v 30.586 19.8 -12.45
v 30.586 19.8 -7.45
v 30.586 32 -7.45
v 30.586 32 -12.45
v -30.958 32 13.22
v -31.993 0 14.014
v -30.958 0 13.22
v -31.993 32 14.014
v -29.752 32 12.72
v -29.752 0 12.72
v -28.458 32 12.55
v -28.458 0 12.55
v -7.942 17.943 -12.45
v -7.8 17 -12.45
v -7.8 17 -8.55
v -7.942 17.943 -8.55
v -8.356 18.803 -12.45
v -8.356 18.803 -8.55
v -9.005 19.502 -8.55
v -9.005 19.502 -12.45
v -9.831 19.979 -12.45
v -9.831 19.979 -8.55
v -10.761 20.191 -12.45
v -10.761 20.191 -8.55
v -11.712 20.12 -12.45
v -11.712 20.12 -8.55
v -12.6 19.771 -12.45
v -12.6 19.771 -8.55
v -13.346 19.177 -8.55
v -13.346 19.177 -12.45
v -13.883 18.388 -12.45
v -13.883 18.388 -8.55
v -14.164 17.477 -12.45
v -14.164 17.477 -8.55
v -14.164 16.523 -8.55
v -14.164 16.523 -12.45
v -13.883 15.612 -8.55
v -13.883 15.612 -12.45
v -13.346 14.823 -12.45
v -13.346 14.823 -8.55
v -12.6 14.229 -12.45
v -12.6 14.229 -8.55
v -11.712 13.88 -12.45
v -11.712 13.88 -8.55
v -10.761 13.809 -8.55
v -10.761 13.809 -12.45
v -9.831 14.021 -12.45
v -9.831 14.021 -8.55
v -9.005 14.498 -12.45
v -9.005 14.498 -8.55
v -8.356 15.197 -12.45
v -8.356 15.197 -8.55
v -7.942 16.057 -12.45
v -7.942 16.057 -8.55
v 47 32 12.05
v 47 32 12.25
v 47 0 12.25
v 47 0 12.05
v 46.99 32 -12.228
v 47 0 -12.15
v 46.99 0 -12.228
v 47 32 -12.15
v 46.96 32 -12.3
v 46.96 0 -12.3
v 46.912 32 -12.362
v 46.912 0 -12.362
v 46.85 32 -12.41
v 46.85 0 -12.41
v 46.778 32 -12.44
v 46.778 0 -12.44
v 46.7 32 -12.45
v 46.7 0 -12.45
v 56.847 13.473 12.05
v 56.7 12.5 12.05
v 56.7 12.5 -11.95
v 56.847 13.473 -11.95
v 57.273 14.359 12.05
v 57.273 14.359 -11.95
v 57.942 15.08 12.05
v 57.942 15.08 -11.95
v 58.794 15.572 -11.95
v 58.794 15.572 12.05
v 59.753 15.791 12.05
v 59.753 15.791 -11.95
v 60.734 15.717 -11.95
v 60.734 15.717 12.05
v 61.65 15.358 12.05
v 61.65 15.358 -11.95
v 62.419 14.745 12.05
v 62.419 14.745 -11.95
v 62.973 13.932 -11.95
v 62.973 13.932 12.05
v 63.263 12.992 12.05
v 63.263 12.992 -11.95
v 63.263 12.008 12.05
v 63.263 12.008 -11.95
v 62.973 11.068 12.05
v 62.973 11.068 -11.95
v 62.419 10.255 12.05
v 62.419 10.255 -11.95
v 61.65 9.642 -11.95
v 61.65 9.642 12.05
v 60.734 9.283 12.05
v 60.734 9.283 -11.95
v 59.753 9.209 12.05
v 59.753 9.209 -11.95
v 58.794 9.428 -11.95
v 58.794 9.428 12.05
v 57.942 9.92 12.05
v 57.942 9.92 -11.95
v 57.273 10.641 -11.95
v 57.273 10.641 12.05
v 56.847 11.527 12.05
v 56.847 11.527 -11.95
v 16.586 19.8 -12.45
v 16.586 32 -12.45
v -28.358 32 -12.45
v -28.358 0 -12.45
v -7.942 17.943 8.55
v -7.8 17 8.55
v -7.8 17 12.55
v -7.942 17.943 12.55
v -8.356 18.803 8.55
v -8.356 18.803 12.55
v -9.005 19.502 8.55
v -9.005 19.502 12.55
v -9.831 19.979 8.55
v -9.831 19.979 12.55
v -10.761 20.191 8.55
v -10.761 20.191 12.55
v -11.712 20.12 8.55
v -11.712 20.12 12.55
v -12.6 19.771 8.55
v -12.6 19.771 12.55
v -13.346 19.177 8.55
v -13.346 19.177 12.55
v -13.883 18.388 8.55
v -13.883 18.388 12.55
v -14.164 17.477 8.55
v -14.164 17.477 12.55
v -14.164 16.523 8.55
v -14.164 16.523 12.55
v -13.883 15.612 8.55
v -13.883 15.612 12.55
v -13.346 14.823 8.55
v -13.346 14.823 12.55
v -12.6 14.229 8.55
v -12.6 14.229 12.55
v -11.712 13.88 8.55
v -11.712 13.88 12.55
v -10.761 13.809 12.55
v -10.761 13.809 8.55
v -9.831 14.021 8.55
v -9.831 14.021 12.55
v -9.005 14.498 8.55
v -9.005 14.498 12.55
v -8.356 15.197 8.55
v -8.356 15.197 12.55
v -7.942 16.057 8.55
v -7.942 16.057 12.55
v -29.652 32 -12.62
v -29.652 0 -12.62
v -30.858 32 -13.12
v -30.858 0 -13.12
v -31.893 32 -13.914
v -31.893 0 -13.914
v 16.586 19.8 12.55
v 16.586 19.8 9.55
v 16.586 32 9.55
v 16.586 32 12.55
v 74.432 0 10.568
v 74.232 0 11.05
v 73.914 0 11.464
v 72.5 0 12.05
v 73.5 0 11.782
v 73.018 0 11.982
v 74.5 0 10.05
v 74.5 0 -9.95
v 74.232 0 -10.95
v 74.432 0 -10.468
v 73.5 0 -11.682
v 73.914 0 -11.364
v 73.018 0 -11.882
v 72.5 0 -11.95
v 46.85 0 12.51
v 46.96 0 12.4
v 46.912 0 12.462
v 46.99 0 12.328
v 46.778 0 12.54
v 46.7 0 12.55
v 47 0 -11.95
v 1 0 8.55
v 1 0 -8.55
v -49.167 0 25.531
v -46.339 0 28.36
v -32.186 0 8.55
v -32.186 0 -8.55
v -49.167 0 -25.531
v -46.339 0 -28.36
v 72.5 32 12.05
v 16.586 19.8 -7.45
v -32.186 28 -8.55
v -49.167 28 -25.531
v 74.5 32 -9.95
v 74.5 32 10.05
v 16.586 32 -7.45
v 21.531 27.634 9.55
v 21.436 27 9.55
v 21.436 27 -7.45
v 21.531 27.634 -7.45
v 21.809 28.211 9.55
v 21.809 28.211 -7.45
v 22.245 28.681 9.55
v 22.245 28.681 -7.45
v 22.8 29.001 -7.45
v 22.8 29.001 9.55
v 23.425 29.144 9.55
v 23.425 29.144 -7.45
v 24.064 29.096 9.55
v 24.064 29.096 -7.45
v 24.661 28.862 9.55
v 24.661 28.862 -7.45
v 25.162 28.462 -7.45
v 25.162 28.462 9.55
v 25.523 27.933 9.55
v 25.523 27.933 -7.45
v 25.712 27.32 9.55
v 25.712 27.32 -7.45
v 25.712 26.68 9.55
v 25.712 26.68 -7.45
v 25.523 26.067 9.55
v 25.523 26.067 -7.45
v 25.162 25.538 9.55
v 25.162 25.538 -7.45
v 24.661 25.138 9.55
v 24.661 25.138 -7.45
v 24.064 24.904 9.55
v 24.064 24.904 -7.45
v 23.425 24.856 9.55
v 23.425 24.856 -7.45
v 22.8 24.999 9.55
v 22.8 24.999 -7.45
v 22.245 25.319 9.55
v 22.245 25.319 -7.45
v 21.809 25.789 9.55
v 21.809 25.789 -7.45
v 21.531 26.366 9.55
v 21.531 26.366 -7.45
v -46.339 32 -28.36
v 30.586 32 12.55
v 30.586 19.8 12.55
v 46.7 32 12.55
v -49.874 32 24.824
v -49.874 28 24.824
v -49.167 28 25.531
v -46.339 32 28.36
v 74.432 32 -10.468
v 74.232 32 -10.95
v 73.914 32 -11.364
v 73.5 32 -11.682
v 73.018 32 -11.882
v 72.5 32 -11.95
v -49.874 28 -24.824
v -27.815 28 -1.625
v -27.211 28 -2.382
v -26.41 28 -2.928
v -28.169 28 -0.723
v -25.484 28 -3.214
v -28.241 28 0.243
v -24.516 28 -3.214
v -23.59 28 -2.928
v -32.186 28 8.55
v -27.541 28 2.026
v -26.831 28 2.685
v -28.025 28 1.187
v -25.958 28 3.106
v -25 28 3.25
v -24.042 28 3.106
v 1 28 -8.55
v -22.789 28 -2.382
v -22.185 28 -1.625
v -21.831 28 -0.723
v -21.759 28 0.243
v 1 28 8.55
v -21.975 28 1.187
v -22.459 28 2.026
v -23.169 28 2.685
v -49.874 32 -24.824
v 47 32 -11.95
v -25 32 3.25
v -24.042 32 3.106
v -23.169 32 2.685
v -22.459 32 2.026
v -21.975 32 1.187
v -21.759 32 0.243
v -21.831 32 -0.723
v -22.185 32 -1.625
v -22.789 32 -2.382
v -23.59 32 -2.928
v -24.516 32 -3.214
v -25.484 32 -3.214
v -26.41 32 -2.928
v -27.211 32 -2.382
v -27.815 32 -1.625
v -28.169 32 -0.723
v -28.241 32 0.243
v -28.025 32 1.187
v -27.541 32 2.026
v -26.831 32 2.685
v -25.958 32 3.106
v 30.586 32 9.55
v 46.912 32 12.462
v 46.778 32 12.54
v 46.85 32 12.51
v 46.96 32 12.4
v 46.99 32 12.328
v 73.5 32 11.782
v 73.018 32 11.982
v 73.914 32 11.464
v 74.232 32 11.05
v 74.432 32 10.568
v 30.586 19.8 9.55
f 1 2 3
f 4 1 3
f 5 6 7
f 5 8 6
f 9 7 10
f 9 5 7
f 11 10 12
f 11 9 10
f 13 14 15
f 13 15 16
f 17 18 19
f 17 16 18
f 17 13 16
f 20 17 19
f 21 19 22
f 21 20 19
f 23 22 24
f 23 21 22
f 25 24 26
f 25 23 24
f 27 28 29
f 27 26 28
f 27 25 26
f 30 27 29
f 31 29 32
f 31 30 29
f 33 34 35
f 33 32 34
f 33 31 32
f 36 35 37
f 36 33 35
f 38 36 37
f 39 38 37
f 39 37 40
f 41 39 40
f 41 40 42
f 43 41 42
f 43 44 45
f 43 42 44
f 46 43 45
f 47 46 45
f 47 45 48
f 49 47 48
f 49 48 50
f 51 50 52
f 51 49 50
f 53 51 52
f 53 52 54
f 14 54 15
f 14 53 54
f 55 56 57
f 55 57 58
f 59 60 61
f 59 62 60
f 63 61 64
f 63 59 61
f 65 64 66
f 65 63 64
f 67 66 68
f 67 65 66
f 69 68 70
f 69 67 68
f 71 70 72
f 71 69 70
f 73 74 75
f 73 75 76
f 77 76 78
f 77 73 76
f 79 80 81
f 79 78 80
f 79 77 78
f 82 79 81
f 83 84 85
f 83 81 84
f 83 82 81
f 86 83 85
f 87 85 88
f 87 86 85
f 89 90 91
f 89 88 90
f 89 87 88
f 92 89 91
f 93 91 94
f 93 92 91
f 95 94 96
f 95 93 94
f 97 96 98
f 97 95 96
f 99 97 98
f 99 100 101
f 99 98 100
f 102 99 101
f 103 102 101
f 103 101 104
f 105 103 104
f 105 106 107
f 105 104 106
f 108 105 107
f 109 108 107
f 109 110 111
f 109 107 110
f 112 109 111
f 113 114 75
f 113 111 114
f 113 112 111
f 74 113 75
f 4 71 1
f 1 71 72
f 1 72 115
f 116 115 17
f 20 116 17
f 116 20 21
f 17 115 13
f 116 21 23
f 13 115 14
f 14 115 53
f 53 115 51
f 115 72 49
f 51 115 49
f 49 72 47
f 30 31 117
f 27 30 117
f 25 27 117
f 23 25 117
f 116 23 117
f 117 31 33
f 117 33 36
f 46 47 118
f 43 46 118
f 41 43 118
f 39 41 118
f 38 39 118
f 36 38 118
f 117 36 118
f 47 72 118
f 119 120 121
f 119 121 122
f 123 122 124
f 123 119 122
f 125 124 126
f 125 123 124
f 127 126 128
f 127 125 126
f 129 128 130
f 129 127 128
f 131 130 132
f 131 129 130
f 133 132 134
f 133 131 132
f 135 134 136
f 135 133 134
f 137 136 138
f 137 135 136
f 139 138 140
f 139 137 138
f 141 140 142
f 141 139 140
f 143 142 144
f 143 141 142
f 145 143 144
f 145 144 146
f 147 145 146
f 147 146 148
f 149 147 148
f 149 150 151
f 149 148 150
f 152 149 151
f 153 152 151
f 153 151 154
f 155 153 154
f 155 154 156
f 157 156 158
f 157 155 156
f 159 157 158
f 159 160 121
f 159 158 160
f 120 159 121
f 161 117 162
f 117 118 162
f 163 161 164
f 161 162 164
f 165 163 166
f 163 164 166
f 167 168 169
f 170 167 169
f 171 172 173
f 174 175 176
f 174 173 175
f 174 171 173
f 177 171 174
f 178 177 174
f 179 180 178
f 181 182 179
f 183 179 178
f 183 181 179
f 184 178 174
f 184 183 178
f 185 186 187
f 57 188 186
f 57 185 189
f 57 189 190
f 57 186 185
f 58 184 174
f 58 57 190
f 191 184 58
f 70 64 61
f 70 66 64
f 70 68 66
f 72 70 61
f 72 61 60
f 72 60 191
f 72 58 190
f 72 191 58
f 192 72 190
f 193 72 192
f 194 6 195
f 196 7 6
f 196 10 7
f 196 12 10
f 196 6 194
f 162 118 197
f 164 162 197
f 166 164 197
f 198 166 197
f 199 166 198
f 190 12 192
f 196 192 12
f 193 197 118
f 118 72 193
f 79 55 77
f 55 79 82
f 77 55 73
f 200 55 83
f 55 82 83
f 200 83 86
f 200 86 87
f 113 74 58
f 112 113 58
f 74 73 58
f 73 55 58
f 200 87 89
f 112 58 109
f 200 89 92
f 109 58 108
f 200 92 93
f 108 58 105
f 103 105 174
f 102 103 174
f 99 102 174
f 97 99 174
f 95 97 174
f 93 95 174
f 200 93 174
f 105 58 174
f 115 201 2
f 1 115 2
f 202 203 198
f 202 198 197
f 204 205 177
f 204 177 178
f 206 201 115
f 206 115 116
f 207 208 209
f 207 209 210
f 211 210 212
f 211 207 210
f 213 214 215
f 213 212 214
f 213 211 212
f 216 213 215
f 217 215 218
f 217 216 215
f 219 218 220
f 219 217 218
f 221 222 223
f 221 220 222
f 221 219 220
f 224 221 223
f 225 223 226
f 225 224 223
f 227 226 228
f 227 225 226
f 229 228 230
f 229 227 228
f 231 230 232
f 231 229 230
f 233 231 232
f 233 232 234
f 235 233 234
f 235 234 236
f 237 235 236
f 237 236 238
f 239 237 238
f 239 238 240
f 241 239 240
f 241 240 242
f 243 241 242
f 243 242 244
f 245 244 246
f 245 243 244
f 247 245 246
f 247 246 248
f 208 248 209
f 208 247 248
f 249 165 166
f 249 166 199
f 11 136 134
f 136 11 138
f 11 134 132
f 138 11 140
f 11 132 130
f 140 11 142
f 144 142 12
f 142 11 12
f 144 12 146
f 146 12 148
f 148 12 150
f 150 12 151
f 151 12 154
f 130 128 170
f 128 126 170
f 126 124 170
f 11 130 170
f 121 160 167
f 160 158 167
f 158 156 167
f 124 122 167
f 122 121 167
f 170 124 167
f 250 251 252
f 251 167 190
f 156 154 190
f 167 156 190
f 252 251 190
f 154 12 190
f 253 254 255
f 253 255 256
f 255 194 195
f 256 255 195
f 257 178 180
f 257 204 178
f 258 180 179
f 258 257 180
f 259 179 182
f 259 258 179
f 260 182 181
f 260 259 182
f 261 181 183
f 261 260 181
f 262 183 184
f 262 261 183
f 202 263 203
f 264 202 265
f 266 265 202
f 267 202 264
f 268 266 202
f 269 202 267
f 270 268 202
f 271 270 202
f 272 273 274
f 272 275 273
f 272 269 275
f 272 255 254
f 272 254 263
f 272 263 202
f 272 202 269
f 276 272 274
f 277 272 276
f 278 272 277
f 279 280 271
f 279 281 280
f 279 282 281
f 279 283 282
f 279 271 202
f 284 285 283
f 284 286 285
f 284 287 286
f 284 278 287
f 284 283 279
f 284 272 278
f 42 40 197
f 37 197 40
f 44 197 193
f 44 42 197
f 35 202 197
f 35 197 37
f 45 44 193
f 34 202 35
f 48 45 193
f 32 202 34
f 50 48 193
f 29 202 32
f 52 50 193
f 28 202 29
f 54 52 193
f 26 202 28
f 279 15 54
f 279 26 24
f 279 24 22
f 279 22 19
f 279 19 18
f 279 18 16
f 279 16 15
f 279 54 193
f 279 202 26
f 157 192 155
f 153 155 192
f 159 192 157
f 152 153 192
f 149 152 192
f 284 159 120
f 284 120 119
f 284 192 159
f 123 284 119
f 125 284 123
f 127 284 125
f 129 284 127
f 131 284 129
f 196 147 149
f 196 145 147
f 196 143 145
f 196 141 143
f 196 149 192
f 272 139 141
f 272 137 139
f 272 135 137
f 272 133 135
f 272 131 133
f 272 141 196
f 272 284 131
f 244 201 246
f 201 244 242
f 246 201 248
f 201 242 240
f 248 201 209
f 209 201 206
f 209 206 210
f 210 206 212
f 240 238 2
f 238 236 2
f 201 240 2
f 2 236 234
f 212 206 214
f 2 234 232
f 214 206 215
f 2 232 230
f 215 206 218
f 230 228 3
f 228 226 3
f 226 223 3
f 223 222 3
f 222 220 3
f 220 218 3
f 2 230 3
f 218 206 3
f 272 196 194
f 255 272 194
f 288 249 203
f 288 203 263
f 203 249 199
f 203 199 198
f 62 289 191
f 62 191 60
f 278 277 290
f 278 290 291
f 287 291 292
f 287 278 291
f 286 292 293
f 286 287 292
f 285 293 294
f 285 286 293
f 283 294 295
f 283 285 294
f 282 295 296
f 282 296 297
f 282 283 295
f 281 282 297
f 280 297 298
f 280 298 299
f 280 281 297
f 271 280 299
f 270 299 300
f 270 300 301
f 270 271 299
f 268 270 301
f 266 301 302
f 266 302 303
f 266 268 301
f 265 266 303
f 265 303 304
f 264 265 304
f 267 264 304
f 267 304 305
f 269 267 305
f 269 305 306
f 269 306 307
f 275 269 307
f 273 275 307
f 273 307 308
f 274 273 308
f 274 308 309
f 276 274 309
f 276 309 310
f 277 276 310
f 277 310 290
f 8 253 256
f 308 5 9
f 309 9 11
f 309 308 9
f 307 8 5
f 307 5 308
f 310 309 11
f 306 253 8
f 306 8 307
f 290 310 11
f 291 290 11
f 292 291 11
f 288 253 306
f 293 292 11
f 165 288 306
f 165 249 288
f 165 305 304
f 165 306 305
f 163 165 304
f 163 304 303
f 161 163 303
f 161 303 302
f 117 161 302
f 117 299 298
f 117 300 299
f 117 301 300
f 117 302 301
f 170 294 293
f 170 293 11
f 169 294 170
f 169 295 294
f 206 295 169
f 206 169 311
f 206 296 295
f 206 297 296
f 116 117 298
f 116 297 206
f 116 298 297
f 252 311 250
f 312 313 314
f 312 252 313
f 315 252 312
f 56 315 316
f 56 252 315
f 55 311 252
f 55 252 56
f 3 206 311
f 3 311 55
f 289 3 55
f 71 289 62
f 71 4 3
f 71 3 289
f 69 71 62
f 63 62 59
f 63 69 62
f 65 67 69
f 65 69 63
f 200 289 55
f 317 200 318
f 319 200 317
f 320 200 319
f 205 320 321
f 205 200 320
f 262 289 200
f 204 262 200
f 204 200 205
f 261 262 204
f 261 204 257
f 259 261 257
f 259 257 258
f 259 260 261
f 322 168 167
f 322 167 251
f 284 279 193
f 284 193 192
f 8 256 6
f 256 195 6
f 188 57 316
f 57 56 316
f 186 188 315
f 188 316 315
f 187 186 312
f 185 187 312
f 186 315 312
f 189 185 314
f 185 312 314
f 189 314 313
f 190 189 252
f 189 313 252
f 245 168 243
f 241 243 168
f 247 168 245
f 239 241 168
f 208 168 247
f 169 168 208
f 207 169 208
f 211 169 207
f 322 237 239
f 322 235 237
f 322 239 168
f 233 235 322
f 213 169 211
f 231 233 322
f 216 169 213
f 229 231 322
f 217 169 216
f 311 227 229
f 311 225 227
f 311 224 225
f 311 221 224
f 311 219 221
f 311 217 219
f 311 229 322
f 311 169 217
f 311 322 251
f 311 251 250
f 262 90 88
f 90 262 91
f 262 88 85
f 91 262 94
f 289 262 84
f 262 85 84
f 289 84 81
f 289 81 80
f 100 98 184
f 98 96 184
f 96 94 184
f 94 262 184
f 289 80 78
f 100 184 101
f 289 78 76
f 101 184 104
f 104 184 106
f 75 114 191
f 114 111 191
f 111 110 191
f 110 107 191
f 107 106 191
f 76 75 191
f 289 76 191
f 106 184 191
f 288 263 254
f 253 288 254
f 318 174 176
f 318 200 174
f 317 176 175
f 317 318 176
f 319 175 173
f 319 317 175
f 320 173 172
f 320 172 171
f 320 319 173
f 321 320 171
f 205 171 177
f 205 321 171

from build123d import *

# Parameters (mm, degrees)
BOSS_EXTRUDE1_DEPTH     = 27
SKETCH2_R               = 3.25
BOSS_EXTRUDE2_DEPTH     = 5
CUT_EXTRUDE1_DEPTH      = 92.228395409
CUT_EXTRUDE1_DEPTH_BACK = 92.228395409
SKETCH3_R               = 3.2
SKETCH4_W               = 10
SKETCH4_H               = 5
SKETCH4_H_2             = 3
CUT_EXTRUDE2_DEPTH      = 10.2
CUT_EXTRUDE3_DEPTH      = 90.058122159
CUT_EXTRUDE3_DEPTH_BACK = 90.058122159
SKETCH5_R               = 2.15
CUT_EXTRUDE4_DEPTH      = 92.183595829
CUT_EXTRUDE4_DEPTH_BACK = 92.183595829
SKETCH6_R               = 3.3
CUT_EXTRUDE5_START      = 9.55
SKETCH8_W               = 14
SKETCH8_H               = 14.4
CUT_EXTRUDE5_DEPTH      = 10
CUT_EXTRUDE6_START      = -7.45
SKETCH8_2_W             = 14
SKETCH8_2_H             = 14.4
CUT_EXTRUDE6_DEPTH      = 10
CUT_EXTRUDE7_DEPTH      = 87.332404543
CUT_EXTRUDE8_START      = -1
CUT_EXTRUDE8_DEPTH      = 86.163733723
FILLET3_R               = 5
FILLET4_R               = 2
FILLET5_R               = 0.3


with BuildPart() as part:
    # Sketch1 → Boss-Extrude1 (new body)
    with BuildSketch(Plane(origin=(0, 0, 0), x_dir=(1, 0, 0), z_dir=(0, 1, 0))):
        Polygon((0, 7.55), (-32.6, 7.55), (-49.874368671, 24.824368671), (-46.338834765, 28.359902577), (-30.428932188, 12.45), (75, 12.45), (75, -12.55), (-30.528932188, -12.55), (-46.338834765, -28.359902577), (-49.874368671, -24.824368671), (-32.6, -7.55), (0, -7.55), align=None)
    extrude(amount=BOSS_EXTRUDE1_DEPTH)

    # Sketch2 → Boss-Extrude2 (add)
    with BuildSketch(Plane(origin=(0, 27, 0), x_dir=(1, 0, 0), z_dir=(0, 1, 0))):
        Polygon((-49.874368671, 24.824368671), (-49.874368671, -24.824368671), (-46.338834765, -28.359902577), (-30.528932188, -12.55), (75, -12.55), (75, 12.45), (-30.428932188, 12.45), (-46.338834765, 28.359902577), align=None)
        with Locations(Location((-25, 0, 0), (0, 0, 270))):
            Circle(SKETCH2_R, mode=Mode.SUBTRACT)
    extrude(amount=BOSS_EXTRUDE2_DEPTH)

    # Sketch3 → Cut-Extrude1 (cut, two sides: drawn at the far end of the back side and taken through both)
    with BuildSketch(Plane.XY.offset(12.55).offset(-CUT_EXTRUDE1_DEPTH_BACK)):
        with Locations((-11, 17)):
            Circle(SKETCH3_R)
    extrude(amount=CUT_EXTRUDE1_DEPTH + CUT_EXTRUDE1_DEPTH_BACK, mode=Mode.SUBTRACT)

    # Sketch4 → Cut-Extrude2 (cut)
    with BuildSketch(Plane(origin=(0, 32, 0), x_dir=(1, 0, 0), z_dir=(0, 1, 0))):
        with Locations((23.58571545, 9.95)):
            Rectangle(SKETCH4_W, SKETCH4_H)
        with Locations((23.58571545, -11.05)):
            Rectangle(SKETCH4_W, SKETCH4_H_2)
    extrude(amount=-CUT_EXTRUDE2_DEPTH, mode=Mode.SUBTRACT)

    # Sketch5 → Cut-Extrude3 (cut, two sides: drawn at the far end of the back side and taken through both)
    with BuildSketch(Plane(origin=(0, 0, -7.45), x_dir=(-1, 0, 0), z_dir=(0, 0, -1)).offset(-CUT_EXTRUDE3_DEPTH_BACK)):
        with Locations((-23.58571545, 27)):
            Circle(SKETCH5_R)
    extrude(amount=CUT_EXTRUDE3_DEPTH + CUT_EXTRUDE3_DEPTH_BACK, mode=Mode.SUBTRACT)

    # Sketch6 → Cut-Extrude4 (cut, two sides: drawn at the far end of the back side and taken through both)
    with BuildSketch(Plane(origin=(0, 0, -12.45), x_dir=(-1, 0, 0), z_dir=(0, 0, -1)).offset(-CUT_EXTRUDE4_DEPTH_BACK)):
        with Locations((-60, 12.5)):
            Circle(SKETCH6_R)
    extrude(amount=CUT_EXTRUDE4_DEPTH + CUT_EXTRUDE4_DEPTH_BACK, mode=Mode.SUBTRACT)

    # Sketch8 → Cut-Extrude5 (cut)
    with BuildSketch(Plane.XY.offset(CUT_EXTRUDE5_START)):
        with Locations((23.58571545, 27)):
            Rectangle(SKETCH8_W, SKETCH8_H)
    extrude(amount=CUT_EXTRUDE5_DEPTH, mode=Mode.SUBTRACT)

    # Sketch8<2> → Cut-Extrude6 (cut)
    with BuildSketch(Plane.XY.offset(CUT_EXTRUDE6_START)):
        with Locations((23.58571545, 27)):
            Rectangle(SKETCH8_2_W, SKETCH8_2_H)
    extrude(amount=-CUT_EXTRUDE6_DEPTH, mode=Mode.SUBTRACT)

    # Sketch9 → Cut-Extrude7 (cut, through all)
    with BuildSketch(Plane.XZ):
        Polygon((75, 12.55), (47, 12.55), (47, 12.05), (74.5, 12.05), (74.5, -11.95), (47, -11.95), (47, -12.45), (75, -12.45), (75, -11.95), (75, 12.05), align=None)
    extrude(amount=-CUT_EXTRUDE7_DEPTH, mode=Mode.SUBTRACT)

    # Sketch10 → Cut-Extrude8 (cut, through all)
    with BuildSketch(Plane.XZ.offset(-27).offset(CUT_EXTRUDE8_START)):
        Polygon((-50.874368671, 27.238582233), (-50.874368671, -27.238582233), (-32.185786438, -8.55), (1, -8.55), (1, 8.55), (-32.185786438, 8.55), align=None)
    extrude(amount=CUT_EXTRUDE8_DEPTH, mode=Mode.SUBTRACT)

    # Fillet3
    fillet3_edges = [part.edges().sort_by_distance(p)[0] for p in [
        (-30.428932188, 16, -12.45),
        (-30.528932188, 16, 12.55),
    ]]
    fillet(fillet3_edges, radius=FILLET3_R)

    # Fillet4
    fillet4_edges = [part.edges().sort_by_distance(p)[0] for p in [
        (74.5, 16, 12.05),
        (74.5, 16, -11.95),
    ]]
    fillet(fillet4_edges, radius=FILLET4_R)

    # Fillet5
    fillet5_edges = [part.edges().sort_by_distance(p)[0] for p in [
        (47, 16, 12.55),
        (47, 16, -12.45),
    ]]
    fillet(fillet5_edges, radius=FILLET5_R)


solid = part.part
